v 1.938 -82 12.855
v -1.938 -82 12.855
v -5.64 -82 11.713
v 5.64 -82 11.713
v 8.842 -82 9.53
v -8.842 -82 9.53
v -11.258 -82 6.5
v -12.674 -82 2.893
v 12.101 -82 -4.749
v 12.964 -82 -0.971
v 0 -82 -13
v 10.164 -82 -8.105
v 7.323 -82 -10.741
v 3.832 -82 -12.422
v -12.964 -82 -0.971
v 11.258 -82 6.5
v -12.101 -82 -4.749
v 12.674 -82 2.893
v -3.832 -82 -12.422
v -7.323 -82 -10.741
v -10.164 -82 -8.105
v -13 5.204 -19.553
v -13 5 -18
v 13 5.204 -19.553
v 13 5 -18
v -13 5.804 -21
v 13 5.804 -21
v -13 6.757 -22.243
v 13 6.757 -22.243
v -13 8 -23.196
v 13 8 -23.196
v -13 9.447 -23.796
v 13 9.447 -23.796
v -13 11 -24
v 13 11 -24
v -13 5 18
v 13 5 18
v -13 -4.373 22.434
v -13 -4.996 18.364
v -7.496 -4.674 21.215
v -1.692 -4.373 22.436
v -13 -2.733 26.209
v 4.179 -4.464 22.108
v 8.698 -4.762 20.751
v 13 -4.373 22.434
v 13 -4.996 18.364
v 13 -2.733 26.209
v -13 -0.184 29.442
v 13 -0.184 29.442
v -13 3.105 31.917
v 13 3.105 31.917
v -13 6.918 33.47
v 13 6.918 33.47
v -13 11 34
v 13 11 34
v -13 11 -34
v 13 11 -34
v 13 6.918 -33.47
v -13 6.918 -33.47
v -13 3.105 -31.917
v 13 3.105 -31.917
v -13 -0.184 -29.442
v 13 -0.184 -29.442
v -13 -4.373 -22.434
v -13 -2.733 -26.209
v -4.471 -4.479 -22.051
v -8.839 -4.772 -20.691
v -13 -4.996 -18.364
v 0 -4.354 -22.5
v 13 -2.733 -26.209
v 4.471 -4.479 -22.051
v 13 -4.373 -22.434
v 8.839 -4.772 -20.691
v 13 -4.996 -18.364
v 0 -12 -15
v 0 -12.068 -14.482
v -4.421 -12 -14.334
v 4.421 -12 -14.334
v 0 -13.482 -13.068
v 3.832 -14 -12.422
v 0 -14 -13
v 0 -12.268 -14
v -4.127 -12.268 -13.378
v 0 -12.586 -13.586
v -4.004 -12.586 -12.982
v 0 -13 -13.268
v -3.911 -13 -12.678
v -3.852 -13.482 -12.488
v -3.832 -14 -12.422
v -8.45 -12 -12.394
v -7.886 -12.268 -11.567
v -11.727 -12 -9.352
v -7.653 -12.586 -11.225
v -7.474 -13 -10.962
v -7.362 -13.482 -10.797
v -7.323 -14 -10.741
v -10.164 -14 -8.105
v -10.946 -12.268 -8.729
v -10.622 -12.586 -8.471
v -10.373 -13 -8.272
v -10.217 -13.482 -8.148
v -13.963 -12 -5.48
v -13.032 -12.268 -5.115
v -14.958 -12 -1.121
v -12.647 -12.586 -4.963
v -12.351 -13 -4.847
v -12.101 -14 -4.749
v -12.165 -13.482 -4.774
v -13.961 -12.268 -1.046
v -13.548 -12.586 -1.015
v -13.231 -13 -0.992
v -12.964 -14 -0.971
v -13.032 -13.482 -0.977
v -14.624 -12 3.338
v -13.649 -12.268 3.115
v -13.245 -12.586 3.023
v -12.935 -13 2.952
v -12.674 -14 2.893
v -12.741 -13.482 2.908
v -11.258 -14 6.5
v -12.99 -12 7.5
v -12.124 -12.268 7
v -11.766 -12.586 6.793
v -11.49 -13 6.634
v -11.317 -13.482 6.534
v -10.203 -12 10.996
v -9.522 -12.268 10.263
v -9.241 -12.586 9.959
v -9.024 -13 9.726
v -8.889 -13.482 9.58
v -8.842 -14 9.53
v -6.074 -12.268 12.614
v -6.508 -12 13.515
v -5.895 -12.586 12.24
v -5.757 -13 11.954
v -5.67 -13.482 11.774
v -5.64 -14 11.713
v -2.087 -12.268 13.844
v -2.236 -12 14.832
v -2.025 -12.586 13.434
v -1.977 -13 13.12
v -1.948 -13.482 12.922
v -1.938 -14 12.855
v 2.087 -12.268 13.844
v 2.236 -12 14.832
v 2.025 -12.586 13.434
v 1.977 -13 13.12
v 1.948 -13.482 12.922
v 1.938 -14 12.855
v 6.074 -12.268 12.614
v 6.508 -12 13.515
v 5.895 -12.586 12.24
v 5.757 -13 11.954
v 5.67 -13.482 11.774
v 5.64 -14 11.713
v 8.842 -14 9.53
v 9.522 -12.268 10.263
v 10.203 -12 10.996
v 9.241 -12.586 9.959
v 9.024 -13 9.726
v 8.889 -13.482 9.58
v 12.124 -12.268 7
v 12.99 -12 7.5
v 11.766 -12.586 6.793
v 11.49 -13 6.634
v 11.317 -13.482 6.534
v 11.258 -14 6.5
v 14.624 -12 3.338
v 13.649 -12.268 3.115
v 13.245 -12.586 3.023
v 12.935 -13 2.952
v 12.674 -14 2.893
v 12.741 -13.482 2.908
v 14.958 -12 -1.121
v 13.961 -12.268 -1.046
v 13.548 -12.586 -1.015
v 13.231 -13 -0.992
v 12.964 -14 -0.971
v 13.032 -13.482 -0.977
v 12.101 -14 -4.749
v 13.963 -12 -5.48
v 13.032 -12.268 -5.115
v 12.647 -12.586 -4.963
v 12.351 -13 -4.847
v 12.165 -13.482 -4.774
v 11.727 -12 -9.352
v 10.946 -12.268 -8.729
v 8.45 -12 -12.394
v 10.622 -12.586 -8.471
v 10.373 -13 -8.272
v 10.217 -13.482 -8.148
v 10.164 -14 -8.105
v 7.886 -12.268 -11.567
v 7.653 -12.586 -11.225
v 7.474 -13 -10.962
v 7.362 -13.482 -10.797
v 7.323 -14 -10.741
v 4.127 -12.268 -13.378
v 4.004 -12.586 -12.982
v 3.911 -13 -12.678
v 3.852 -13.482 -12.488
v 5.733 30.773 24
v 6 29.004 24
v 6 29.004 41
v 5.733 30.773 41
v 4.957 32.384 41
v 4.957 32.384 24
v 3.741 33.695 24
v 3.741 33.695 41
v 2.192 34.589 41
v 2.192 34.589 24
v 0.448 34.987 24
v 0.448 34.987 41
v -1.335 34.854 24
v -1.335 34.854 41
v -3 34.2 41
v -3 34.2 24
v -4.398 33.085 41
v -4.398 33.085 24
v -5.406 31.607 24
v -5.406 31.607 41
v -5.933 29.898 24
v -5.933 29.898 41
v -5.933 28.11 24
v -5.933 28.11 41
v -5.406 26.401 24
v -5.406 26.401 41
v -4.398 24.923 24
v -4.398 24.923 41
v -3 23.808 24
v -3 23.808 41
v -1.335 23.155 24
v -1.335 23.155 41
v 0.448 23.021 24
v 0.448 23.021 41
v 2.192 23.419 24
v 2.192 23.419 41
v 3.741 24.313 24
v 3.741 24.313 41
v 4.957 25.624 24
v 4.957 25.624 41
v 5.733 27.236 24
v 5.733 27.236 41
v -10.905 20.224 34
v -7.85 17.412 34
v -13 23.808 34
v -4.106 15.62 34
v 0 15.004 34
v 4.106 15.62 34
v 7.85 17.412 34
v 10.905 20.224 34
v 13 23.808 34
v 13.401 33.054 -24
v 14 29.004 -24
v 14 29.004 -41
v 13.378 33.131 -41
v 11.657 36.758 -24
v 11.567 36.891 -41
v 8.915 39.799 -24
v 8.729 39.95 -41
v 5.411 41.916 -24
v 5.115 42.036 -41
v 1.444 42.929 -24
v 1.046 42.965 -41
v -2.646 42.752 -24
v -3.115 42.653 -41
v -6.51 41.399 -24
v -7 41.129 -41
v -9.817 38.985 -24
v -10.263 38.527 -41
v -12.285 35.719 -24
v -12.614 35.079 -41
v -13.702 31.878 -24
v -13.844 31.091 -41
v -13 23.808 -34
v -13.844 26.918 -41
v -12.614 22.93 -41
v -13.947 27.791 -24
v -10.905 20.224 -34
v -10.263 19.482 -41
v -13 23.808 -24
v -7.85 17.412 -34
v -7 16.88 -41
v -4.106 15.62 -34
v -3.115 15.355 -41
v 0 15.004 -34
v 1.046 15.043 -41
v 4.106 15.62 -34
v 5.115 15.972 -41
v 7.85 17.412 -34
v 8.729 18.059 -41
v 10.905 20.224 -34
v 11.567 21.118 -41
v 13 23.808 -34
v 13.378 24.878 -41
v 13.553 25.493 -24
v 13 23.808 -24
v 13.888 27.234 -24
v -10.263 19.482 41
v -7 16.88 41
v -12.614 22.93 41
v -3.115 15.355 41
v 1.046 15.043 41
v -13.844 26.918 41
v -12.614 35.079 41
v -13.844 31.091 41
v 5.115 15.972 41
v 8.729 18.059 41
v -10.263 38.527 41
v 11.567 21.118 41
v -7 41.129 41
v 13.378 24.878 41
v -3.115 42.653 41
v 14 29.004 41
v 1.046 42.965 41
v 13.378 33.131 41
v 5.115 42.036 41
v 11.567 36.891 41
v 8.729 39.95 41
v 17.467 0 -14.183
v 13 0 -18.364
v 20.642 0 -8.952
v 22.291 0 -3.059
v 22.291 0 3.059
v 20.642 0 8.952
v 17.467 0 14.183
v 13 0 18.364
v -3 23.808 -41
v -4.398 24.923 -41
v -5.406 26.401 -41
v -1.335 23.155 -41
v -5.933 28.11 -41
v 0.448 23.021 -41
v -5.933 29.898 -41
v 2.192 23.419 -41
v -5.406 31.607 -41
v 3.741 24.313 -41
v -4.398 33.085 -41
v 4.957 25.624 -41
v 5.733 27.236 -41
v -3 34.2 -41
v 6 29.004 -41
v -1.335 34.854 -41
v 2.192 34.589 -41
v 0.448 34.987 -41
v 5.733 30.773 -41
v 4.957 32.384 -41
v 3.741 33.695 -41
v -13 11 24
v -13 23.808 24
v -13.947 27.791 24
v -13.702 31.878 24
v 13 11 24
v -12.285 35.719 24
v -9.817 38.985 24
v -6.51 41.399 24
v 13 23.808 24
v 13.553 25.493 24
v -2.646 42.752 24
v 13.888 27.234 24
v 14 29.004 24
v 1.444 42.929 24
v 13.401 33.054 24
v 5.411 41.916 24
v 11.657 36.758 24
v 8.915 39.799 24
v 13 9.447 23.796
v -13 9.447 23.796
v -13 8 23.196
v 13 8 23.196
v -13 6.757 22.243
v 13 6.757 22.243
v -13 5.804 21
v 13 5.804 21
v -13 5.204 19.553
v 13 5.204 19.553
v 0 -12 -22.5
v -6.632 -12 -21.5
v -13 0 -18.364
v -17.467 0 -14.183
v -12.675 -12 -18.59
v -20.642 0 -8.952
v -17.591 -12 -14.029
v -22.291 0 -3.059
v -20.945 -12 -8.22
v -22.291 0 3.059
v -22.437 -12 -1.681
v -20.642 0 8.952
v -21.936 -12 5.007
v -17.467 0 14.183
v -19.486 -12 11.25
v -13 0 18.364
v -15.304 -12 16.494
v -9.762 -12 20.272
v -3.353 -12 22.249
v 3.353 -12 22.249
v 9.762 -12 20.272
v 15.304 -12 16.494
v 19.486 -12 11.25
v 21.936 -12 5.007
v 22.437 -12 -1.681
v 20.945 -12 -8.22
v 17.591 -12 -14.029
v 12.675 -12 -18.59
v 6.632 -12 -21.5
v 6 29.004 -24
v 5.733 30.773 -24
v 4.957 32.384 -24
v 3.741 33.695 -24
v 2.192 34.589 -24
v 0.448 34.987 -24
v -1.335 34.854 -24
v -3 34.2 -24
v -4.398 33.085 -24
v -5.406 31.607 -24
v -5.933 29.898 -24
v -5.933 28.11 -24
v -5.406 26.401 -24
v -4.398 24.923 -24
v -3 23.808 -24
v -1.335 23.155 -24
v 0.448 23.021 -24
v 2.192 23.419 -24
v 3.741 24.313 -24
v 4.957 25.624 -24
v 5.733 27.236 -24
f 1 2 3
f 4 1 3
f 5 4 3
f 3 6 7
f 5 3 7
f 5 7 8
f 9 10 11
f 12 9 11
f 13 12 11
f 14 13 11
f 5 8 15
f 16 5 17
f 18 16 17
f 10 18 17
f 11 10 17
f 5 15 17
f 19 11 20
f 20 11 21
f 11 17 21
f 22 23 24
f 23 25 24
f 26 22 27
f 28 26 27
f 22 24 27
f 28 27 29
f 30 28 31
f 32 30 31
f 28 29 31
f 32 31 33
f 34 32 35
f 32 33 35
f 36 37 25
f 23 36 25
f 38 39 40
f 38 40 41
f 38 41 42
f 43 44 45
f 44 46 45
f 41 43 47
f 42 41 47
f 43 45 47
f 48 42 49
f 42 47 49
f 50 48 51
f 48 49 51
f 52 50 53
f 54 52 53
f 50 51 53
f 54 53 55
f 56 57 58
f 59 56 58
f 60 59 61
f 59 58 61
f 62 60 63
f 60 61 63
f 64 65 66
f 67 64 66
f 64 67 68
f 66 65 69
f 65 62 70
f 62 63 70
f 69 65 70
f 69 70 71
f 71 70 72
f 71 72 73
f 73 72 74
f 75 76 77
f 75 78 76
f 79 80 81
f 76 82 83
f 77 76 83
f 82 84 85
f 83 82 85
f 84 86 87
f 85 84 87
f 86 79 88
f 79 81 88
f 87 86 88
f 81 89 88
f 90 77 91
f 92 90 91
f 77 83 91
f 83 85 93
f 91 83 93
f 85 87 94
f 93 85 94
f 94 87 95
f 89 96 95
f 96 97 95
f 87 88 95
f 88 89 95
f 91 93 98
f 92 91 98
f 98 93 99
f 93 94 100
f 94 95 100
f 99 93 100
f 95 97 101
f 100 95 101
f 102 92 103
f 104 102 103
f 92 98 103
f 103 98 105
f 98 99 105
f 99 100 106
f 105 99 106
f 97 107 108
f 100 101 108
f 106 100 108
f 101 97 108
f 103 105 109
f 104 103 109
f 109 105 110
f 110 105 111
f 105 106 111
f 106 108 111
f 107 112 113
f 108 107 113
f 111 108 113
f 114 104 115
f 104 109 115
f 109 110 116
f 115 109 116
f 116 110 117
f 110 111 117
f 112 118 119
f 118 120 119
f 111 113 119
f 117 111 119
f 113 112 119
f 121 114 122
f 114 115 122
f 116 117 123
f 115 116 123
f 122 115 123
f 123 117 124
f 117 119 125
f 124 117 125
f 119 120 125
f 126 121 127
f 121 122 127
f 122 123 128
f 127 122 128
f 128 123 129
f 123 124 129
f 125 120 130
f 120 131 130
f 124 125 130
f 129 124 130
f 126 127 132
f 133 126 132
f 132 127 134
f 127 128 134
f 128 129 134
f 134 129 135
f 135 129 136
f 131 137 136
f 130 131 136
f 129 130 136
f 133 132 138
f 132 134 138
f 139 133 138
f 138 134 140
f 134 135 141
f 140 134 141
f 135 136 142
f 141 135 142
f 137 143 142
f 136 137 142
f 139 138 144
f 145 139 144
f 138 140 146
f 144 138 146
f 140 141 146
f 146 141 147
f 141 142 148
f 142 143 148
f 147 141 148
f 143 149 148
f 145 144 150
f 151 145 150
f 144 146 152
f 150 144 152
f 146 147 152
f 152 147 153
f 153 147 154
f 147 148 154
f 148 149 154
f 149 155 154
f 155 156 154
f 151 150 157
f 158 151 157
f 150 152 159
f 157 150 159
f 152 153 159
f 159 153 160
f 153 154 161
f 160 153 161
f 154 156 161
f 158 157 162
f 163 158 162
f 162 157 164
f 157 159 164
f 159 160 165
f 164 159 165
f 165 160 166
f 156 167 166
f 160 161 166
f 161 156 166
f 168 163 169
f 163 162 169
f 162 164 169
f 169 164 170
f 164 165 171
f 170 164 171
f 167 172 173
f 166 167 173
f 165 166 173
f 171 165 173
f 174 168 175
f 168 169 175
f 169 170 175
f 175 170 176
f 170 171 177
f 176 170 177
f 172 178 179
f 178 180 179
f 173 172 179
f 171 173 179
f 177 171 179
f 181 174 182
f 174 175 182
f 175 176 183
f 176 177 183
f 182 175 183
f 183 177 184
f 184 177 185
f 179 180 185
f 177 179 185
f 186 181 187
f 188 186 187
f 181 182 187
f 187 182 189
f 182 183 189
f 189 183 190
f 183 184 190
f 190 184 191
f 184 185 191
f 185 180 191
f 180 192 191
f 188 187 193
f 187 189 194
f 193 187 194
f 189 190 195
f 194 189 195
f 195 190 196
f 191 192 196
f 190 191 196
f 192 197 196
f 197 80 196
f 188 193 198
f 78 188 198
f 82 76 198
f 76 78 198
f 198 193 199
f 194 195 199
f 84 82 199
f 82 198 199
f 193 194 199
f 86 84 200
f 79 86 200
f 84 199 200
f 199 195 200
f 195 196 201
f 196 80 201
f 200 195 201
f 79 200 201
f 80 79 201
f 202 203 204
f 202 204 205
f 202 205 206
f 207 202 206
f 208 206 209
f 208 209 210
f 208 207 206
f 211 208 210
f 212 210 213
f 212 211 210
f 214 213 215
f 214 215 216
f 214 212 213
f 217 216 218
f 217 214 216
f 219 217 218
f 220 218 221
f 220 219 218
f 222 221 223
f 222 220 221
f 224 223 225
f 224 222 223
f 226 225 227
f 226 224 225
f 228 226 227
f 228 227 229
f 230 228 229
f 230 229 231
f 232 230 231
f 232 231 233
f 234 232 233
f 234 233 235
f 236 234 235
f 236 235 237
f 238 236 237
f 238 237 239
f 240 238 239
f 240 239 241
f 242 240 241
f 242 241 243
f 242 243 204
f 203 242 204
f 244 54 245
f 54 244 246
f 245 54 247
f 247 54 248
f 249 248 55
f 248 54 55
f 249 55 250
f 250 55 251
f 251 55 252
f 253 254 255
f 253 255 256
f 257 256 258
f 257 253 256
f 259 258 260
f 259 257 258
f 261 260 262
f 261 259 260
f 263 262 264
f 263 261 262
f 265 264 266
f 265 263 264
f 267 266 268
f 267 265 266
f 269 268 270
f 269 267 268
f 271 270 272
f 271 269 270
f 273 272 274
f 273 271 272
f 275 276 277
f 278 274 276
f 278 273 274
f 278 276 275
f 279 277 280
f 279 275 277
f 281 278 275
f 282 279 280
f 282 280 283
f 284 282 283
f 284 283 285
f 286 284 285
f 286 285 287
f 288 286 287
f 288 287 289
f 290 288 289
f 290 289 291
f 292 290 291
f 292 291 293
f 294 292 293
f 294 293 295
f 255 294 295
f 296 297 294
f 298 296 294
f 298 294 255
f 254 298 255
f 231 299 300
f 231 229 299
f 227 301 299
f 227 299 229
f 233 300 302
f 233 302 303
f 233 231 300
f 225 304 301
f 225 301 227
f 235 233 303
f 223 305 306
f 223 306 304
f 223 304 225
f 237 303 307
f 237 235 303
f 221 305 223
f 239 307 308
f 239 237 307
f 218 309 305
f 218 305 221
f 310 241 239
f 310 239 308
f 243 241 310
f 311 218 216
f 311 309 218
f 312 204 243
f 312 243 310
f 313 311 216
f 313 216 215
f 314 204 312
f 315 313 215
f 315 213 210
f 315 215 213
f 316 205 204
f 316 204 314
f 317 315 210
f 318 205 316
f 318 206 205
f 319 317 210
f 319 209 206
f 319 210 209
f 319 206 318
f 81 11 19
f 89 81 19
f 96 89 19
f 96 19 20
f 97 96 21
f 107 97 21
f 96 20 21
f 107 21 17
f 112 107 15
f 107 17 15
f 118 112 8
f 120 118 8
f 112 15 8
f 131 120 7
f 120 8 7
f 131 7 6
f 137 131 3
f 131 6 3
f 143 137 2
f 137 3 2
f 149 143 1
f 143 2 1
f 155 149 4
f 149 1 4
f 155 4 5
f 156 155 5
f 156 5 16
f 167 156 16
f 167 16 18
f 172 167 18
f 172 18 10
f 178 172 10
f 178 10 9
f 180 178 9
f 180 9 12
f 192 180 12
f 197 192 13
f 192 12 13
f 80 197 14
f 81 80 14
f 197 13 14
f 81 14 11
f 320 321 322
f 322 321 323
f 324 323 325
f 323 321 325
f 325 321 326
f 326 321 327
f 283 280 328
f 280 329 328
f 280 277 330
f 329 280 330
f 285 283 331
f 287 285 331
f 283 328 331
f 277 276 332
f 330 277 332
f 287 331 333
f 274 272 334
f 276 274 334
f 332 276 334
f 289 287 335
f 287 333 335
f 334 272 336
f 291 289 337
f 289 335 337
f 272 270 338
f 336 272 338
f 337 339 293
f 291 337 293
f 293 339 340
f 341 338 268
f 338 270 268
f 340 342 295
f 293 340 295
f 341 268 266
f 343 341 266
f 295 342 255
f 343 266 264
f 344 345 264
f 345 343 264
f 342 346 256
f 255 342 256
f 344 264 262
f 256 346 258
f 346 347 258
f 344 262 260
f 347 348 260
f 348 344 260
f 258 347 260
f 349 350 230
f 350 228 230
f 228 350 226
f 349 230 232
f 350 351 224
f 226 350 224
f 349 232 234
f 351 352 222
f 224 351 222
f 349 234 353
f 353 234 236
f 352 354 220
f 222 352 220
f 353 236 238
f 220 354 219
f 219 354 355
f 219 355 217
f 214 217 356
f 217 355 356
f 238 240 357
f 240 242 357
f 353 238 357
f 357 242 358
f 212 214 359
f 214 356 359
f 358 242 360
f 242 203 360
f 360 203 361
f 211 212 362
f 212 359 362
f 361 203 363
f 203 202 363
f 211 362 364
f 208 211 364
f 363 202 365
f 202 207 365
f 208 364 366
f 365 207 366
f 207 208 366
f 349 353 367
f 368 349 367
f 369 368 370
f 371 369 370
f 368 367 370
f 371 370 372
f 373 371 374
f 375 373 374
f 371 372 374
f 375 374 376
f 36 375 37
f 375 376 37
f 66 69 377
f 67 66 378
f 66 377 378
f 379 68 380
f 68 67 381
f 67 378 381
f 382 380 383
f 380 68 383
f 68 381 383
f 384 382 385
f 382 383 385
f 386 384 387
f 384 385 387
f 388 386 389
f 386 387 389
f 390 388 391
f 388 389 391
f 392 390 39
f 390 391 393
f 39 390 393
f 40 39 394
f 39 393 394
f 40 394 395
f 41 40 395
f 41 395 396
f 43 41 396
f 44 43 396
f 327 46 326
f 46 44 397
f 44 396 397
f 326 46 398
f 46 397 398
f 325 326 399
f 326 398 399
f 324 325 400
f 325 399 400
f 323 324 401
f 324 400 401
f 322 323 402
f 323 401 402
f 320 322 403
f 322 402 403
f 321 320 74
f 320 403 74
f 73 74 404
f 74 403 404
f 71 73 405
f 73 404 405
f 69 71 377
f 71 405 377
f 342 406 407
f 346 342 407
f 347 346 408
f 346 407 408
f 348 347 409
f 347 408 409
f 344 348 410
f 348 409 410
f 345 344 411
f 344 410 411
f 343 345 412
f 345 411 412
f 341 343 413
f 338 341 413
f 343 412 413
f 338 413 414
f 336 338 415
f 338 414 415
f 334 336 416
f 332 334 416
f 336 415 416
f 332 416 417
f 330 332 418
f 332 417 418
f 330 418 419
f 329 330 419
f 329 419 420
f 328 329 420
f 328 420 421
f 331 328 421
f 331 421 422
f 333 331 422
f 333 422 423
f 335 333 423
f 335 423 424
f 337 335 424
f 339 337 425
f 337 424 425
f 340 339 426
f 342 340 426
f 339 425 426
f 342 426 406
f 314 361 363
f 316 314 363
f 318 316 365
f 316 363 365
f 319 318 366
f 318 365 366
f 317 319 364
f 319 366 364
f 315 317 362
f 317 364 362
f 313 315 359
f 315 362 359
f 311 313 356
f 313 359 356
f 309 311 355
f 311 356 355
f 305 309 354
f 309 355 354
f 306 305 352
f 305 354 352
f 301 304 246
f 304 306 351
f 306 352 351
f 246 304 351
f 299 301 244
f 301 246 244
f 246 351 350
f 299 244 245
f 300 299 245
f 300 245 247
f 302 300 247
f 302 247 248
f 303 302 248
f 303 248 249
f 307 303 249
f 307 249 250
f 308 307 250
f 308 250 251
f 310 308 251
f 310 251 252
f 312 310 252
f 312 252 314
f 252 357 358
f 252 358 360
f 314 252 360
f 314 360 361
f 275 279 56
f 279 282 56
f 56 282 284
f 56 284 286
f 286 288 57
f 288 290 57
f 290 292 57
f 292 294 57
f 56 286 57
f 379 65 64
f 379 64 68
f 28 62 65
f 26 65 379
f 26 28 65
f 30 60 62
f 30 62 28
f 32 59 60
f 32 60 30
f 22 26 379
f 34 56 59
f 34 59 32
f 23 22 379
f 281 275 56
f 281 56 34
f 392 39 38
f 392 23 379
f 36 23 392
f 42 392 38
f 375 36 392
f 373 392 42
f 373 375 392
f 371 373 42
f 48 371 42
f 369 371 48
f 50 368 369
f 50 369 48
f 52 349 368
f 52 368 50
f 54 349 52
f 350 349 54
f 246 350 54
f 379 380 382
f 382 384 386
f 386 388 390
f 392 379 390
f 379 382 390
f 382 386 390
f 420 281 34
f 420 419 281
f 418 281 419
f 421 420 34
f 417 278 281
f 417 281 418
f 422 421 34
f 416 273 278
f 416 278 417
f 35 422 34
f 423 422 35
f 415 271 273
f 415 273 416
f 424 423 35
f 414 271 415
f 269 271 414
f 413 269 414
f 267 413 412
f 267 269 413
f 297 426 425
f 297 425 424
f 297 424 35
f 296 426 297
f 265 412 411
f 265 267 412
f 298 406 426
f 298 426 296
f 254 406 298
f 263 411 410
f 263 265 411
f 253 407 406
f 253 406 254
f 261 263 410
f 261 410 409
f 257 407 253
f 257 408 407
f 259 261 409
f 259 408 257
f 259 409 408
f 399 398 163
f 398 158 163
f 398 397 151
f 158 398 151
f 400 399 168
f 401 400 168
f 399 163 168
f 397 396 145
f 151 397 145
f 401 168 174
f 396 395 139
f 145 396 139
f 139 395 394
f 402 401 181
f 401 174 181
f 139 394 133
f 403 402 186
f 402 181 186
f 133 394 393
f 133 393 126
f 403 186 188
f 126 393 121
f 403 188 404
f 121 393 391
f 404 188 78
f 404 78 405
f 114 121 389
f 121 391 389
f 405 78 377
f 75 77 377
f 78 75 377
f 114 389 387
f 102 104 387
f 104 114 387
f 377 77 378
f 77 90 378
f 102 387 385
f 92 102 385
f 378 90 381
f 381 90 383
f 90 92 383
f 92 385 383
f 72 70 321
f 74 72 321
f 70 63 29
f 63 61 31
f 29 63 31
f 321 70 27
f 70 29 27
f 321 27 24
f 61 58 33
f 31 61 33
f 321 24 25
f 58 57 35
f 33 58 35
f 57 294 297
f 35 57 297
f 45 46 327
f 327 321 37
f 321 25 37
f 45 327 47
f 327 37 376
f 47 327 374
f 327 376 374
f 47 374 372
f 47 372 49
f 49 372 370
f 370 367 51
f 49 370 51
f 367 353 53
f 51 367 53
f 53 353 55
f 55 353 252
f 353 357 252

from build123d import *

# Parameters (mm, degrees)
BOSS_EXTRUDE1_DEPTH     = 13
SKETCH3_R               = 14
SKETCH3_R_2             = 6
BOSS_EXTRUDE2_DEPTH     = 17
CUT_EXTRUDE1_DEPTH      = 114.3809949
CUT_EXTRUDE1_DEPTH_BACK = 114.3809949
SKETCH4_R               = 6
FILLET1_R               = 2


with BuildPart() as part:
    # Sketch1 → Revolve1 (revolve)
    with BuildSketch(Plane.XY, mode=Mode.PRIVATE) as revolve1_sk:
        Polygon((0, 0), (22.5, 0), (22.5, -12), (13, -12), (13, -82), (0, -82), align=None)
    revolve(revolve1_sk.sketch.rotate(Axis((0, 0, 0), (0, 1, 0)), 90), axis=Axis((0, 0, 0), (0, 1, 0)))

    # Sketch2 → Boss-Extrude1 (add, symmetric)
    with BuildSketch(Plane(origin=(0, 0, 0), x_dir=(0, 0, -1), z_dir=(1, 0, 0))):
        with BuildLine():
            Line((-18, 5), (18, 5))
            ThreePointArc((18, 5), (22.242640687, 6.757359313), (24, 11))
            Line((24, 11), (24, 29))
            Line((24, 29), (34, 29))
            Line((34, 29), (34, 11))
            ThreePointArc((34, 11), (29.313708499, -0.313708499), (18, -5))
            Line((18, -5), (-18, -5))
            ThreePointArc((-18, -5), (-29.313708499, -0.313708499), (-34, 11))
            Line((-34, 11), (-34, 29))
            Line((-34, 29), (-24, 29))
            Line((-24, 29), (-24, 11))
            ThreePointArc((-24, 11), (-22.242640687, 6.757359313), (-18, 5))
        make_face()
    extrude(amount=BOSS_EXTRUDE1_DEPTH, both=True)

    # Sketch3 → Boss-Extrude2 (add)
    with BuildSketch(Plane.XY.offset(-24)):
        with Locations((0, 29.004149407)):
            Circle(SKETCH3_R)
        with Locations((0, 29.004149407)):
            Circle(SKETCH3_R_2, mode=Mode.SUBTRACT)
    boss_extrude2 = extrude(amount=-BOSS_EXTRUDE2_DEPTH)

    # Mirror1: Boss-Extrude2 across plane
    add(boss_extrude2.mirror(Plane.XY))

    # Sketch4 → Cut-Extrude1 (cut, two sides: drawn at the far end of the back side and taken through both)
    with BuildSketch(Plane(origin=(0, 0, -34), x_dir=(-1, 0, 0), z_dir=(0, 0, -1)).offset(-CUT_EXTRUDE1_DEPTH_BACK)):
        with Locations(Location((0, 29.004149407, 0), (0, 0, 180))):
            Circle(SKETCH4_R)
    extrude(amount=CUT_EXTRUDE1_DEPTH + CUT_EXTRUDE1_DEPTH_BACK, mode=Mode.SUBTRACT)

    # Fillet1
    fillet1_edges = [part.edges().sort_by_distance(p)[0] for p in [
        (0, -12, 13),
    ]]
    fillet(fillet1_edges, radius=FILLET1_R)


solid = part.part
